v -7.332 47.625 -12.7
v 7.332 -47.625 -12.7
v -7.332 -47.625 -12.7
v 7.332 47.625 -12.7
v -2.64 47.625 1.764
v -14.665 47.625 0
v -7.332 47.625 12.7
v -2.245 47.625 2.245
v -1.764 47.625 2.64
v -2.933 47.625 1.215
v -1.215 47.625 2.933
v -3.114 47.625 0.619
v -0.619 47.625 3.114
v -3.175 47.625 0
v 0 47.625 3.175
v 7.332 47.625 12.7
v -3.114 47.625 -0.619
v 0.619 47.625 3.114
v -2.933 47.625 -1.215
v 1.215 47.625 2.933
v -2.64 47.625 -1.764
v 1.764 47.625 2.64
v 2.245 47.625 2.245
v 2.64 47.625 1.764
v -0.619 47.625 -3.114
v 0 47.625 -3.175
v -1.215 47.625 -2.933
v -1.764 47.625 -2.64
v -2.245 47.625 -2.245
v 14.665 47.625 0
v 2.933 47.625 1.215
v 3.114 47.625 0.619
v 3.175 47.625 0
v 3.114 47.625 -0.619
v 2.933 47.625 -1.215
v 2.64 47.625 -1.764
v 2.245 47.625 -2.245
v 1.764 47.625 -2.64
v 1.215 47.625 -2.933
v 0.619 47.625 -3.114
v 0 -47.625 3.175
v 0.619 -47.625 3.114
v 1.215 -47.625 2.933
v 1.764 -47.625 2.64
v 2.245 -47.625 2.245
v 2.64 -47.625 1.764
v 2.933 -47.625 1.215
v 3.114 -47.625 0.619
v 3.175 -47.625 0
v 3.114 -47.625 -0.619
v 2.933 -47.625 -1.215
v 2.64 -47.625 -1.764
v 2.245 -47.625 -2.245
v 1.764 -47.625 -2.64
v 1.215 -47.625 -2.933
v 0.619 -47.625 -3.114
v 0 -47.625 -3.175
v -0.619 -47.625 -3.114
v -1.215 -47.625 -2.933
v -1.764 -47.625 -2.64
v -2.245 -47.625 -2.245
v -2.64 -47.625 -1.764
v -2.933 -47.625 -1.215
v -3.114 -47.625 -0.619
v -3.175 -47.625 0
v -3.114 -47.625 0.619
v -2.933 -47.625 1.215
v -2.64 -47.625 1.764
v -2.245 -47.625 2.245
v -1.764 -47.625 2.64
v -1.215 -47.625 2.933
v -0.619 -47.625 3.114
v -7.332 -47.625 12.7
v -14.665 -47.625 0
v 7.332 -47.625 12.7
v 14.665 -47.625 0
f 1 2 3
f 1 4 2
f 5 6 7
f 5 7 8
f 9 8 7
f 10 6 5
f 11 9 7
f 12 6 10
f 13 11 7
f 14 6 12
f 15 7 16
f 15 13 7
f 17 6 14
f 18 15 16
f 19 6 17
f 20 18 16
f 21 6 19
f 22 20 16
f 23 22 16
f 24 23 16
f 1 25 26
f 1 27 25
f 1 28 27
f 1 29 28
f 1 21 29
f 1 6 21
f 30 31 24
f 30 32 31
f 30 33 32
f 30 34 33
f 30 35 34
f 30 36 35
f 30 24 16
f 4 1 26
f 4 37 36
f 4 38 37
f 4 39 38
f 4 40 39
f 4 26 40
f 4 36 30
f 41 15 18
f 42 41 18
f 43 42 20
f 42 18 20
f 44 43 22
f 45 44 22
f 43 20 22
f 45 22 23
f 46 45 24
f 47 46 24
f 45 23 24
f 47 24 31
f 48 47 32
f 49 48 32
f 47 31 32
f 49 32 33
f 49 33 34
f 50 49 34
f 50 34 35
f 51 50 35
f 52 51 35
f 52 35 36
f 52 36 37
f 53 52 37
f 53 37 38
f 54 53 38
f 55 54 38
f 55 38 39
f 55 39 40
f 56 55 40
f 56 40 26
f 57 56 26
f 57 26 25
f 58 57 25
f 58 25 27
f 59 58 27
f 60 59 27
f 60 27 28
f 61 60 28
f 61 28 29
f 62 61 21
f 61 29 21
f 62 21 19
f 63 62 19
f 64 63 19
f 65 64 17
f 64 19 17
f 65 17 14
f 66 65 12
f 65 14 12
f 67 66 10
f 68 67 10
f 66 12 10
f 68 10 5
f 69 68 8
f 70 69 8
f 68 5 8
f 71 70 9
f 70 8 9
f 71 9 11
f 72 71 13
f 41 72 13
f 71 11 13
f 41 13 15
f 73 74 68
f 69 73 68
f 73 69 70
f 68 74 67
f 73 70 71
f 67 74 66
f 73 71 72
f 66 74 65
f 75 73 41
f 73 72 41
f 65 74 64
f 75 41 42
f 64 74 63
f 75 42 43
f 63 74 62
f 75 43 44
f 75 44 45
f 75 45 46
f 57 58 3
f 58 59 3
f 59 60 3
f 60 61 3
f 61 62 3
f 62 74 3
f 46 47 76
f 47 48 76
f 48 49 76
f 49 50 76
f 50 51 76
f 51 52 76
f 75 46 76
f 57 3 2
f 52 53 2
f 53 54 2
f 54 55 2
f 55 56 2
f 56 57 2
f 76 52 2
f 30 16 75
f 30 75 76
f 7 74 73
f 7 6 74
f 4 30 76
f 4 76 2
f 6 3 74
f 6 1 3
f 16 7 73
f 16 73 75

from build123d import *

# Parameters (mm, degrees)
BOSS_EXTRUDE1_DEPTH = 47.625
SKETCH2_R           = 3.175
CUT_EXTRUDE1_DEPTH  = 98.205482527


with BuildPart() as part:
    # Sketch1 → Boss-Extrude1 (new, symmetric)
    with BuildSketch(Plane(origin=(0, 0, 0), x_dir=(1, 0, 0), z_dir=(0, 1, 0))):
        Polygon((-14.664696837, 0), (-7.332348419, -12.7), (7.332348419, -12.7), (14.664696837, 0), (7.332348419, 12.7), (-7.332348419, 12.7), align=None)
    extrude(amount=BOSS_EXTRUDE1_DEPTH, both=True)

    # Sketch2 → Cut-Extrude1 (cut, through all)
    with BuildSketch(Plane(origin=(0, 47.625, 0), x_dir=(1, 0, 0), z_dir=(0, 1, 0))):
        with Locations(Location((0, 0, 0), (0, 0, 270))):
            Circle(SKETCH2_R)
    extrude(amount=-CUT_EXTRUDE1_DEPTH, mode=Mode.SUBTRACT)


solid = part.part
